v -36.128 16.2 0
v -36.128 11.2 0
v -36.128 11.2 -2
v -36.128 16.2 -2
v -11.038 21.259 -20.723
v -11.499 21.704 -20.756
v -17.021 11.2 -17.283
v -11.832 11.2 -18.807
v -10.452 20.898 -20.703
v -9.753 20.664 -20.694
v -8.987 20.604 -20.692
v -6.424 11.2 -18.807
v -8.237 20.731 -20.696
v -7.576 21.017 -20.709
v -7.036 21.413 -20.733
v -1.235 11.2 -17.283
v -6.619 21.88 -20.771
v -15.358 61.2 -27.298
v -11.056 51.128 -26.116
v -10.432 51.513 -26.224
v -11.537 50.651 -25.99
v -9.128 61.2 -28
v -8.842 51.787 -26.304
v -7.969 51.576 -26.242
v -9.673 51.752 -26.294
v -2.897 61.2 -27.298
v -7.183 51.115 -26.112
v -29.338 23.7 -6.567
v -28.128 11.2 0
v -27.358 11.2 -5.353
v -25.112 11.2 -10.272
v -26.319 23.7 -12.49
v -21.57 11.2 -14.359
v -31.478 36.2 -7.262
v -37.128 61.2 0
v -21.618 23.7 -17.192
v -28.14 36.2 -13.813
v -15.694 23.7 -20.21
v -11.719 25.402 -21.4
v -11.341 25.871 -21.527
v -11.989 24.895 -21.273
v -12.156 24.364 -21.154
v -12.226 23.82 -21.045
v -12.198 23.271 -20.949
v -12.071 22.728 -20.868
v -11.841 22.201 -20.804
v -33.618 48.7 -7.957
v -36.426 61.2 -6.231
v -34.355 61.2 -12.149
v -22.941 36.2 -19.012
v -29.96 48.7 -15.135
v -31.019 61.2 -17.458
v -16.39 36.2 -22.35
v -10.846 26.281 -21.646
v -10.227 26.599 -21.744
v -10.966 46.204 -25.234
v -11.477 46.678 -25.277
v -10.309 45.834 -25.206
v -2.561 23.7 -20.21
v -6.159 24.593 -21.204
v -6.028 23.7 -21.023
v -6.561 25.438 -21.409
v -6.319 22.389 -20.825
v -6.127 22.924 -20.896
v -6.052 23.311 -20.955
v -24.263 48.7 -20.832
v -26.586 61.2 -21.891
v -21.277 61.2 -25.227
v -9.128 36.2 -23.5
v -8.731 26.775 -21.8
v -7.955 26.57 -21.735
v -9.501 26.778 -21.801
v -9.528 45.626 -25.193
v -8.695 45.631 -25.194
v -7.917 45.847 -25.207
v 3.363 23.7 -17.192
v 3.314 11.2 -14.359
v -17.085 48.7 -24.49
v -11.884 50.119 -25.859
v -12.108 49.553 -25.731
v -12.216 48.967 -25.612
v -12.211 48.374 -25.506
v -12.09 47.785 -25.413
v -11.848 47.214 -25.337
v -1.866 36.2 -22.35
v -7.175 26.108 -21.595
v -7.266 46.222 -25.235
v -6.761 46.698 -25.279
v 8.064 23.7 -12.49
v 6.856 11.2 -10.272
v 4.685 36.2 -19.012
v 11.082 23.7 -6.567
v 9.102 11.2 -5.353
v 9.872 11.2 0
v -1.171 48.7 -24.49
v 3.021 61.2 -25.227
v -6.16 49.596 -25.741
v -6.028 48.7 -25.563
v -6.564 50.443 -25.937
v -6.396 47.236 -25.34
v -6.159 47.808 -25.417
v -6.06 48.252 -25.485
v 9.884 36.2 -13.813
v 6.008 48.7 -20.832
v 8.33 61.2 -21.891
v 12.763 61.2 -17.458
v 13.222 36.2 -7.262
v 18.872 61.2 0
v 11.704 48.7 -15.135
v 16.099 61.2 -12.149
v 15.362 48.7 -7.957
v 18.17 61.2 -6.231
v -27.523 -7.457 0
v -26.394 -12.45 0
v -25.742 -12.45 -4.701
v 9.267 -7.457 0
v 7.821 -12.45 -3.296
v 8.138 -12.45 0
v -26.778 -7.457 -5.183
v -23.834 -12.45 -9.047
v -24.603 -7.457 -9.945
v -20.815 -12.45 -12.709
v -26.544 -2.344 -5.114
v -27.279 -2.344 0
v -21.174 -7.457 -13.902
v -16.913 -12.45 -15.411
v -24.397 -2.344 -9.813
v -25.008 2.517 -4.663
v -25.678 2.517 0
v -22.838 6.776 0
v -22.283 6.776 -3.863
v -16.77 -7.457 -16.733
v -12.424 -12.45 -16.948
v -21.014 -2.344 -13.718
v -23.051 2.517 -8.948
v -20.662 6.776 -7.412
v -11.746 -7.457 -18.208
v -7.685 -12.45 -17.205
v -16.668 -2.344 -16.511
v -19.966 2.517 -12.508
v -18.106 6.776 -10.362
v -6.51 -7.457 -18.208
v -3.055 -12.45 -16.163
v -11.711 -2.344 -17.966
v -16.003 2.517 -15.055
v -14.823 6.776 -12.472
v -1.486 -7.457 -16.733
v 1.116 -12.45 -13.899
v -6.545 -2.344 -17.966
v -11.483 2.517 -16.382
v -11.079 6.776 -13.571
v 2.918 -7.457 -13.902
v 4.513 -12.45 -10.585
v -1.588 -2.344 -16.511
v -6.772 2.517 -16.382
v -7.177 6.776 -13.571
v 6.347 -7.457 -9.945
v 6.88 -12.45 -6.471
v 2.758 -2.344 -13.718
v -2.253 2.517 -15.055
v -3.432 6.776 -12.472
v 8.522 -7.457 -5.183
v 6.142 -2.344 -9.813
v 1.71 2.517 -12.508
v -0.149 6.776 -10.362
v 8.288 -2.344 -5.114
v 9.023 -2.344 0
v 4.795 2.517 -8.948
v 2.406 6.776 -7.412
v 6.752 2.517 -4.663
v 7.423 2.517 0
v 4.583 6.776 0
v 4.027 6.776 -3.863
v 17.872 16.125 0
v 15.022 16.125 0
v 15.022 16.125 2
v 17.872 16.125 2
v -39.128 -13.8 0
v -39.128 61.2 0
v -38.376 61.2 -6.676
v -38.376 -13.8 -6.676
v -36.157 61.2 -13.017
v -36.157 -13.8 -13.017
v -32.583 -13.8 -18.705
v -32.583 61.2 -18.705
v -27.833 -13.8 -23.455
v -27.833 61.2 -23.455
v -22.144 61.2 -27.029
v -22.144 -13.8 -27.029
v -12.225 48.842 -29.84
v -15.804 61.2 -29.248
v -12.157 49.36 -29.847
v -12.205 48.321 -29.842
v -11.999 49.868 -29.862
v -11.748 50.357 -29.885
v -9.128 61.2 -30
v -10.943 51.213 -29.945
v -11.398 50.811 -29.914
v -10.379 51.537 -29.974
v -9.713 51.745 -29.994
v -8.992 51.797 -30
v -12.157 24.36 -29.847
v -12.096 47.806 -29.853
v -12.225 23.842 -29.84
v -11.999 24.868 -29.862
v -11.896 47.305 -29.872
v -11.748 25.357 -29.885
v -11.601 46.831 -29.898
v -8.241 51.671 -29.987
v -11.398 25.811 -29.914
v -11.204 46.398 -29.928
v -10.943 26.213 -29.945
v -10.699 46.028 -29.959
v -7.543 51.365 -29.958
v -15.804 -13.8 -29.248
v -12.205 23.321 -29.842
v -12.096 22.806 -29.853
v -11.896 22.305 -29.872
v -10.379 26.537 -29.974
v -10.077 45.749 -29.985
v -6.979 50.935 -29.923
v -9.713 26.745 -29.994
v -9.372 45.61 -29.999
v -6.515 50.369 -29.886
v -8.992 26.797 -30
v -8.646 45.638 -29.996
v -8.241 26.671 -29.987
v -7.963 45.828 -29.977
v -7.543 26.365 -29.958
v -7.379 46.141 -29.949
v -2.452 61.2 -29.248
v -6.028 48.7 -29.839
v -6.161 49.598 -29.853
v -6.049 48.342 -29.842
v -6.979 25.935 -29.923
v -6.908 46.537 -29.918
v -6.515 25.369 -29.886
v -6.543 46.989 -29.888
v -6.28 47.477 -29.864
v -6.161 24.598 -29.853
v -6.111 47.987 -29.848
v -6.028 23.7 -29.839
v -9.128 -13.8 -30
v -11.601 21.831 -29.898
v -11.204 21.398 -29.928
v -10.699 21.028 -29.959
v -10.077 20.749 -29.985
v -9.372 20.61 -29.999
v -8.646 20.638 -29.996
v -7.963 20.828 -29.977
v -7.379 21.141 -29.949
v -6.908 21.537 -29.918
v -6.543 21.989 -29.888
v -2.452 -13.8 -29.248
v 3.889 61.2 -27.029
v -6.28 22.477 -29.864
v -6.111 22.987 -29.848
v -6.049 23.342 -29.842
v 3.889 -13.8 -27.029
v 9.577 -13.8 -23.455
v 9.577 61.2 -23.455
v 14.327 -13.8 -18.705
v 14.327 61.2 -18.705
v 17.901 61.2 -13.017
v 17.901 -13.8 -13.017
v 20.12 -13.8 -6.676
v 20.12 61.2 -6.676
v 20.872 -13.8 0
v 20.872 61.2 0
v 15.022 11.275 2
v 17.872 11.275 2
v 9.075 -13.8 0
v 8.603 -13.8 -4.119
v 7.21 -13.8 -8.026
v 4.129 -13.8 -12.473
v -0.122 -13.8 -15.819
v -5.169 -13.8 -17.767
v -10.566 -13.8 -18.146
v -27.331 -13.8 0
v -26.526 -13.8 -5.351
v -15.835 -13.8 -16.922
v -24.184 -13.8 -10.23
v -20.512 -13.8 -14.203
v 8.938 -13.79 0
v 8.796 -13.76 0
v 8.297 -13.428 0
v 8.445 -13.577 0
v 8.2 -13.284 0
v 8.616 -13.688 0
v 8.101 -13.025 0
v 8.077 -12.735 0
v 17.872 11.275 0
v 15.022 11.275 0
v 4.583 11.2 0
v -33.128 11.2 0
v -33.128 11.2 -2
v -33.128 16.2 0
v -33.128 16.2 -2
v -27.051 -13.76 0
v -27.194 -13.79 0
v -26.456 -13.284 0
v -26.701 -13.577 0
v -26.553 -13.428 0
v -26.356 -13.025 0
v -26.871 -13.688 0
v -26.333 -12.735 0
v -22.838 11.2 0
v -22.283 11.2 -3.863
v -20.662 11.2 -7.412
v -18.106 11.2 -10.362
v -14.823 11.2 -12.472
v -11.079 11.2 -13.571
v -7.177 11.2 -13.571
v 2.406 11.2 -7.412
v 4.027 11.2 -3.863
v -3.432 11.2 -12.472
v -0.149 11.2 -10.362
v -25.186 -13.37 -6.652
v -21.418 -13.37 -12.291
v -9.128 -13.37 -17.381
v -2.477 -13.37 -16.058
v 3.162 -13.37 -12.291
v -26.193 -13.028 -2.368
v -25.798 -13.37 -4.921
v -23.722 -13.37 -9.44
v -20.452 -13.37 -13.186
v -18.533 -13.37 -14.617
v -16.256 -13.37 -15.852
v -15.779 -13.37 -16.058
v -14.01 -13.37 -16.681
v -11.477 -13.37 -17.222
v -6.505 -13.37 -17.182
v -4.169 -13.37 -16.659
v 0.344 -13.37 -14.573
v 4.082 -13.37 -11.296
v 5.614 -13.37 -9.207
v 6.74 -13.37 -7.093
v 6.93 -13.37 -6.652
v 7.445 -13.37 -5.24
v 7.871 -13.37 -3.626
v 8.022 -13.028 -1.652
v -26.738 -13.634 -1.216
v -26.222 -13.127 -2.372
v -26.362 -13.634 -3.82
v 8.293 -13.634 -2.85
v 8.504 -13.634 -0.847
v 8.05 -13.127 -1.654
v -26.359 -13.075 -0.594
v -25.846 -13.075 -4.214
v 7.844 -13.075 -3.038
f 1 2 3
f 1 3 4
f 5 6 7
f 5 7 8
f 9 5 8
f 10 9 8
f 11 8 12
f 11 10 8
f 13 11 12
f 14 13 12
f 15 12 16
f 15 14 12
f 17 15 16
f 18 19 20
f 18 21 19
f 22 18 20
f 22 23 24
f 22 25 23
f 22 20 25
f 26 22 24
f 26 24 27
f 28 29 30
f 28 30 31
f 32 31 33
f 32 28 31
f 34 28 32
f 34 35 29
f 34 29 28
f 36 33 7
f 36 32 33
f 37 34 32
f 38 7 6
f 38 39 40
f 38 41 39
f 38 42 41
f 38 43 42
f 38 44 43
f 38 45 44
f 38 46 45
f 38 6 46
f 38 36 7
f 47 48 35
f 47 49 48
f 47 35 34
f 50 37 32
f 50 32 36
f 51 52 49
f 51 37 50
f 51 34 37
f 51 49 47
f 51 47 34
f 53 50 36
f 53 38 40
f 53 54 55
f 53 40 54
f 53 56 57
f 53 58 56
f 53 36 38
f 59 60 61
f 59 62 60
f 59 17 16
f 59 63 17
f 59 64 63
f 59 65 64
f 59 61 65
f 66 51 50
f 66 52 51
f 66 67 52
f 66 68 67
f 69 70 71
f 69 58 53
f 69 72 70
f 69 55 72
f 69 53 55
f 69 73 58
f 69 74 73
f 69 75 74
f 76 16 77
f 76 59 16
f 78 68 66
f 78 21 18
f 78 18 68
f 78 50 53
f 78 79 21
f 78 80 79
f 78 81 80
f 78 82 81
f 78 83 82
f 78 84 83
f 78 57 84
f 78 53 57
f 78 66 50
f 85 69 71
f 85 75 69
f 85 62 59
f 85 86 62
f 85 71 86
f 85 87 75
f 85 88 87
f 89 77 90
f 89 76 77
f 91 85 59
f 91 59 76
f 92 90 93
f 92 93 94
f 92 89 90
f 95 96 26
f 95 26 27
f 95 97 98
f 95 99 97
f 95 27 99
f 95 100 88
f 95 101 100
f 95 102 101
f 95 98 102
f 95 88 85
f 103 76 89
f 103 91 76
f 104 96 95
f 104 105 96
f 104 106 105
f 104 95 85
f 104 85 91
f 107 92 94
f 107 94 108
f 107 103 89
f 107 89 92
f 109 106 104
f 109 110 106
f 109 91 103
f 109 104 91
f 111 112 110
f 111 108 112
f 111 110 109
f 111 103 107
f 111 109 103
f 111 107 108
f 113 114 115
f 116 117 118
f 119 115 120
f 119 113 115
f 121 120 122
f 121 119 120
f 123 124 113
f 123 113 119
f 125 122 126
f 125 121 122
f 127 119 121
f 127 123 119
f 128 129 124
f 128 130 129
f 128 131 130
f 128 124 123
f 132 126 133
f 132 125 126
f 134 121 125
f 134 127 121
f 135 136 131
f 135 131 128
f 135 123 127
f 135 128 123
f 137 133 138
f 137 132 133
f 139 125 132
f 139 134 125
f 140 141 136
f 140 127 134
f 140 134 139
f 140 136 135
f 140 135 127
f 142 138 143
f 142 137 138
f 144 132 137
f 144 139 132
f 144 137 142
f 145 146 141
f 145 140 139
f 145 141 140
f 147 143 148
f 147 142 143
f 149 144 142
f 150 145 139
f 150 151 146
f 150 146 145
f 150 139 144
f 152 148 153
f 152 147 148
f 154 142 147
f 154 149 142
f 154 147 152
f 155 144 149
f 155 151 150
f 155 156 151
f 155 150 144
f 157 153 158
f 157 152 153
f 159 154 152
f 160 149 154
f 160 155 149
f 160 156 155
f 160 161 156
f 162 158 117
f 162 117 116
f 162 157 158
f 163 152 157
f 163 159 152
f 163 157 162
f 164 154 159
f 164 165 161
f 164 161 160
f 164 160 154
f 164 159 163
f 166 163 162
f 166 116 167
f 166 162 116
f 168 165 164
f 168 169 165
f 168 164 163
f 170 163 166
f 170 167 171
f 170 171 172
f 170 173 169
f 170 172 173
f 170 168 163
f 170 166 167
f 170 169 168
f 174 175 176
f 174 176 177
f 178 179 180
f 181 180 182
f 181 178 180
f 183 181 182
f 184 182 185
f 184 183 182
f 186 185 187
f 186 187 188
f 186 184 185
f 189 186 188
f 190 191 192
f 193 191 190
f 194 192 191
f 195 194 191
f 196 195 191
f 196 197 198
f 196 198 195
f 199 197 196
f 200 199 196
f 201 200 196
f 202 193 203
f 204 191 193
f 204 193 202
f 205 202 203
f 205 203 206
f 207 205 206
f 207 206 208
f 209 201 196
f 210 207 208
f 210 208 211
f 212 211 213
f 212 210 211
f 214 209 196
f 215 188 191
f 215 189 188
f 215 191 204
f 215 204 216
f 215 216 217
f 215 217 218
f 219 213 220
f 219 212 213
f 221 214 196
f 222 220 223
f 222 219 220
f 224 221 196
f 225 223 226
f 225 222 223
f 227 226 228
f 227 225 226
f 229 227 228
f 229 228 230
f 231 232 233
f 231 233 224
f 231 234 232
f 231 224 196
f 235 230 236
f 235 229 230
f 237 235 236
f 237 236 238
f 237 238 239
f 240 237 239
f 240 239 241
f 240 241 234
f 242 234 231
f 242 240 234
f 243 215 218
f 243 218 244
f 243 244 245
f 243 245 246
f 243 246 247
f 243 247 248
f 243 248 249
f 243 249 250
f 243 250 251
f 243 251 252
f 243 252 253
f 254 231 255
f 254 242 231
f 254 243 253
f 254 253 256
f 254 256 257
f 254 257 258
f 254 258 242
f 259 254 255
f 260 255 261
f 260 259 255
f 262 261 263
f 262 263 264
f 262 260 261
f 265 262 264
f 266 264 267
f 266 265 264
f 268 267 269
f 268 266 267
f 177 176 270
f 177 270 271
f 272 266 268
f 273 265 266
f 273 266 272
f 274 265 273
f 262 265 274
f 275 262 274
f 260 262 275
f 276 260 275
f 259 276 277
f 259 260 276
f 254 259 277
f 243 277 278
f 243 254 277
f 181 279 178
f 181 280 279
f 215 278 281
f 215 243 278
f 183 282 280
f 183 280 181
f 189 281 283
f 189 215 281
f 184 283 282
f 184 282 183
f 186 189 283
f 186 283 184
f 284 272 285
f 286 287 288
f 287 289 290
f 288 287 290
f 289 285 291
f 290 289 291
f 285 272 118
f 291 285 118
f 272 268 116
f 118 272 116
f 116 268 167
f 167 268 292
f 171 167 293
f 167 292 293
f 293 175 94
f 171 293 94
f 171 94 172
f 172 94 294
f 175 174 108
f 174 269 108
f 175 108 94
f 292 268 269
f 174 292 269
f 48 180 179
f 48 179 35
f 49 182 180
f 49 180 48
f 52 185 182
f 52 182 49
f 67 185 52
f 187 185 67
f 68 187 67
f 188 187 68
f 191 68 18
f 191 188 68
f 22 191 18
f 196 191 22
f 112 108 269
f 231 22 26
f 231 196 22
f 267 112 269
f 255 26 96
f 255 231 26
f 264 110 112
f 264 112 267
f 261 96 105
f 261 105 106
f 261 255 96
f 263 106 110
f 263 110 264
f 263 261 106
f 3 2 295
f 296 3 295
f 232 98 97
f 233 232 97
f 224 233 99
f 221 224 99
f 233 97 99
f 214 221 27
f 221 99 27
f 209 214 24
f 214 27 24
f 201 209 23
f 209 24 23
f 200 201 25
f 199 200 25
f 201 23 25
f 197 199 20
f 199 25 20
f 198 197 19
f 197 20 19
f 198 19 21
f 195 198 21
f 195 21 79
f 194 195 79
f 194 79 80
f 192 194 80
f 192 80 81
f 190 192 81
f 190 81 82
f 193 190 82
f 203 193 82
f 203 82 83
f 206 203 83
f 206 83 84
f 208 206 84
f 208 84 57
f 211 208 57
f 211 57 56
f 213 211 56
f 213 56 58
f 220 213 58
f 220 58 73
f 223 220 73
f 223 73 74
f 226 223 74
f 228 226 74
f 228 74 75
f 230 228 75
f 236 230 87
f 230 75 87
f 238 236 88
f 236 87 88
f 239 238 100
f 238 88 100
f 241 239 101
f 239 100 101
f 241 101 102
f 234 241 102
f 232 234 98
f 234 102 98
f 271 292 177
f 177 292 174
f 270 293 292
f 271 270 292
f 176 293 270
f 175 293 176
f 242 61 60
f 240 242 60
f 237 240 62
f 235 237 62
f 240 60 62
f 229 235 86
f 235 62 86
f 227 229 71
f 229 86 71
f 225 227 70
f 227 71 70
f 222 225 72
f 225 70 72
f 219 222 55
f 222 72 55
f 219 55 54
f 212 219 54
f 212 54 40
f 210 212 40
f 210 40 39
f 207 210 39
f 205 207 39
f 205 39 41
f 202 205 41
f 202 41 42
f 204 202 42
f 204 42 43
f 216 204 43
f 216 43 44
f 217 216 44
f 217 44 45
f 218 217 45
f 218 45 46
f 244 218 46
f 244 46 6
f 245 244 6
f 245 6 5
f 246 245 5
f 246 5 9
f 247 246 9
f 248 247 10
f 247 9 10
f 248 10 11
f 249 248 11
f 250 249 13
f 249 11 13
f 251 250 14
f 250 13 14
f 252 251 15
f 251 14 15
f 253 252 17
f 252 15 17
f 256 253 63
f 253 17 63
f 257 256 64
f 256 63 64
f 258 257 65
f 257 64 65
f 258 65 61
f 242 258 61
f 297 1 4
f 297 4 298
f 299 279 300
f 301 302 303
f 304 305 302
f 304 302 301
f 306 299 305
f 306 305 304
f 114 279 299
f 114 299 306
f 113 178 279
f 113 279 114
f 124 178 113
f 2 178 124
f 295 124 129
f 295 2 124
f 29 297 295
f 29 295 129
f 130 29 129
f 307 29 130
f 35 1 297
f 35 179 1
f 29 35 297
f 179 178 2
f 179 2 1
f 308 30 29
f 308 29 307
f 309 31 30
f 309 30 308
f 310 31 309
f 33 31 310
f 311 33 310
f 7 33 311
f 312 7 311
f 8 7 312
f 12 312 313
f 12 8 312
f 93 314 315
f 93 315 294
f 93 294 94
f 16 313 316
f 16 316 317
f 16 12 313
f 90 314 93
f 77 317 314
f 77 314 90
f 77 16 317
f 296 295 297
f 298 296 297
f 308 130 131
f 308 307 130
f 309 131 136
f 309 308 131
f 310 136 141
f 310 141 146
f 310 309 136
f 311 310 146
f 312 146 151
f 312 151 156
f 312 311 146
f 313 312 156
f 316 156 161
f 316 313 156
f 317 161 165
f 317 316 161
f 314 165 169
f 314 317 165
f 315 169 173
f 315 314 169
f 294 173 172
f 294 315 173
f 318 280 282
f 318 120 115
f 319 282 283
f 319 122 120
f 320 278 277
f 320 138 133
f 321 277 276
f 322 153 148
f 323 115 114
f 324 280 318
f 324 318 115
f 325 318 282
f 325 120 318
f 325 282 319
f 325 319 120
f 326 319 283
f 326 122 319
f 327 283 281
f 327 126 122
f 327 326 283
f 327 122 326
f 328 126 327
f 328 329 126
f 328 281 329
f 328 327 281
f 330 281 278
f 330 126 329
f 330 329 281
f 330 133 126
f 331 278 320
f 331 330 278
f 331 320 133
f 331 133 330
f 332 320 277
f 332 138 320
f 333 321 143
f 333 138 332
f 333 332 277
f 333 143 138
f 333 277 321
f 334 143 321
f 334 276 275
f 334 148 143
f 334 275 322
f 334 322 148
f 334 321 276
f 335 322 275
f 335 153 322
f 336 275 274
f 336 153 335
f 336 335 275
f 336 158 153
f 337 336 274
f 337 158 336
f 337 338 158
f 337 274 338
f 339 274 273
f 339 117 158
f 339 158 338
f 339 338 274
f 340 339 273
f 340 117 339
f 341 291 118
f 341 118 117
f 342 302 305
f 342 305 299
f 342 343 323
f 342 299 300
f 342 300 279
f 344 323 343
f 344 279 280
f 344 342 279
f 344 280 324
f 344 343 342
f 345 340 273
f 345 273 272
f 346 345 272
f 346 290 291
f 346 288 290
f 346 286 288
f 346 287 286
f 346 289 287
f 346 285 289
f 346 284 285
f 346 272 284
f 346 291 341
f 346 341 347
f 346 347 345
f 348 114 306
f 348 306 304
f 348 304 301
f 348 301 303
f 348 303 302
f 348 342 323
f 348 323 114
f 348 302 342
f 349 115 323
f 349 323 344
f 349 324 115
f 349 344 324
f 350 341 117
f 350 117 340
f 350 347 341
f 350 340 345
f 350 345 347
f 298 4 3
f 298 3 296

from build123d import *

# Parameters (mm, degrees)
REVOLVE8_ANGLE      = 180
SKETCH5_W           = 2.85
SKETCH5_H           = 4.85
BOSS_EXTRUDE1_DEPTH = 2
SKETCH6_W           = 3
SKETCH6_H           = 5
CUT_EXTRUDE1_DEPTH  = 2
FILLET1_R           = 1
SKETCH7_R           = 3.1
CUT_EXTRUDE2_DEPTH  = 40


with BuildPart() as part:
    # Sketch3 → Revolve8 (revolve)
    with BuildSketch(Plane.XY):
        with BuildLine():
            Line((-28.127877823, 11.200453936), (-37.127877823, 61.200453936))
            Line((-37.127877823, 61.200453936), (-39.127877823, 61.200453936))
            Line((-39.127877823, 61.200453936), (-39.127877823, -13.799546064))
            Line((-39.127877823, -13.799546064), (-25.829212511, -13.799546064))
            ThreePointArc((-25.829212511, -13.799546064), (-27.397927857, -3.066483557), (-22.838440036, 6.77580121))
            Line((-22.838440036, 6.77580121), (-22.838440036, 11.200453936))
            Line((-22.838440036, 11.200453936), (-28.127877823, 11.200453936))
        make_face()
    revolve(axis=Axis((-9.127877823, 95.858464184, 0), (0, -1, 0)), revolution_arc=REVOLVE8_ANGLE)

    # Sketch5 → Boss-Extrude1 (add)
    with BuildSketch(Plane.XY):
        with Locations((16.447122177, 13.700453936)):
            Rectangle(SKETCH5_W, SKETCH5_H)
    extrude(amount=BOSS_EXTRUDE1_DEPTH)

    # Sketch6 → Cut-Extrude1 (cut)
    with BuildSketch(Plane.XY):
        with Locations((-34.627877823, 13.700453936)):
            Rectangle(SKETCH6_W, SKETCH6_H)
    extrude(amount=-CUT_EXTRUDE1_DEPTH, mode=Mode.SUBTRACT)

    # Fillet1
    fillet1_edges = [part.edges().sort_by_distance(p)[0] for p in [
        (-9.127877823, -13.799546064, -16.701334688),
    ]]
    fillet(fillet1_edges, radius=FILLET1_R)

    # Sketch7 → Cut-Extrude2 (cut)
    with BuildSketch(Plane.XY):
        with Locations((-9.127877823, 23.700453936)):
            Circle(SKETCH7_R)
        with Locations((-9.127877823, 48.700453936)):
            Circle(SKETCH7_R)
    extrude(amount=-CUT_EXTRUDE2_DEPTH, mode=Mode.SUBTRACT)


solid = part.part
